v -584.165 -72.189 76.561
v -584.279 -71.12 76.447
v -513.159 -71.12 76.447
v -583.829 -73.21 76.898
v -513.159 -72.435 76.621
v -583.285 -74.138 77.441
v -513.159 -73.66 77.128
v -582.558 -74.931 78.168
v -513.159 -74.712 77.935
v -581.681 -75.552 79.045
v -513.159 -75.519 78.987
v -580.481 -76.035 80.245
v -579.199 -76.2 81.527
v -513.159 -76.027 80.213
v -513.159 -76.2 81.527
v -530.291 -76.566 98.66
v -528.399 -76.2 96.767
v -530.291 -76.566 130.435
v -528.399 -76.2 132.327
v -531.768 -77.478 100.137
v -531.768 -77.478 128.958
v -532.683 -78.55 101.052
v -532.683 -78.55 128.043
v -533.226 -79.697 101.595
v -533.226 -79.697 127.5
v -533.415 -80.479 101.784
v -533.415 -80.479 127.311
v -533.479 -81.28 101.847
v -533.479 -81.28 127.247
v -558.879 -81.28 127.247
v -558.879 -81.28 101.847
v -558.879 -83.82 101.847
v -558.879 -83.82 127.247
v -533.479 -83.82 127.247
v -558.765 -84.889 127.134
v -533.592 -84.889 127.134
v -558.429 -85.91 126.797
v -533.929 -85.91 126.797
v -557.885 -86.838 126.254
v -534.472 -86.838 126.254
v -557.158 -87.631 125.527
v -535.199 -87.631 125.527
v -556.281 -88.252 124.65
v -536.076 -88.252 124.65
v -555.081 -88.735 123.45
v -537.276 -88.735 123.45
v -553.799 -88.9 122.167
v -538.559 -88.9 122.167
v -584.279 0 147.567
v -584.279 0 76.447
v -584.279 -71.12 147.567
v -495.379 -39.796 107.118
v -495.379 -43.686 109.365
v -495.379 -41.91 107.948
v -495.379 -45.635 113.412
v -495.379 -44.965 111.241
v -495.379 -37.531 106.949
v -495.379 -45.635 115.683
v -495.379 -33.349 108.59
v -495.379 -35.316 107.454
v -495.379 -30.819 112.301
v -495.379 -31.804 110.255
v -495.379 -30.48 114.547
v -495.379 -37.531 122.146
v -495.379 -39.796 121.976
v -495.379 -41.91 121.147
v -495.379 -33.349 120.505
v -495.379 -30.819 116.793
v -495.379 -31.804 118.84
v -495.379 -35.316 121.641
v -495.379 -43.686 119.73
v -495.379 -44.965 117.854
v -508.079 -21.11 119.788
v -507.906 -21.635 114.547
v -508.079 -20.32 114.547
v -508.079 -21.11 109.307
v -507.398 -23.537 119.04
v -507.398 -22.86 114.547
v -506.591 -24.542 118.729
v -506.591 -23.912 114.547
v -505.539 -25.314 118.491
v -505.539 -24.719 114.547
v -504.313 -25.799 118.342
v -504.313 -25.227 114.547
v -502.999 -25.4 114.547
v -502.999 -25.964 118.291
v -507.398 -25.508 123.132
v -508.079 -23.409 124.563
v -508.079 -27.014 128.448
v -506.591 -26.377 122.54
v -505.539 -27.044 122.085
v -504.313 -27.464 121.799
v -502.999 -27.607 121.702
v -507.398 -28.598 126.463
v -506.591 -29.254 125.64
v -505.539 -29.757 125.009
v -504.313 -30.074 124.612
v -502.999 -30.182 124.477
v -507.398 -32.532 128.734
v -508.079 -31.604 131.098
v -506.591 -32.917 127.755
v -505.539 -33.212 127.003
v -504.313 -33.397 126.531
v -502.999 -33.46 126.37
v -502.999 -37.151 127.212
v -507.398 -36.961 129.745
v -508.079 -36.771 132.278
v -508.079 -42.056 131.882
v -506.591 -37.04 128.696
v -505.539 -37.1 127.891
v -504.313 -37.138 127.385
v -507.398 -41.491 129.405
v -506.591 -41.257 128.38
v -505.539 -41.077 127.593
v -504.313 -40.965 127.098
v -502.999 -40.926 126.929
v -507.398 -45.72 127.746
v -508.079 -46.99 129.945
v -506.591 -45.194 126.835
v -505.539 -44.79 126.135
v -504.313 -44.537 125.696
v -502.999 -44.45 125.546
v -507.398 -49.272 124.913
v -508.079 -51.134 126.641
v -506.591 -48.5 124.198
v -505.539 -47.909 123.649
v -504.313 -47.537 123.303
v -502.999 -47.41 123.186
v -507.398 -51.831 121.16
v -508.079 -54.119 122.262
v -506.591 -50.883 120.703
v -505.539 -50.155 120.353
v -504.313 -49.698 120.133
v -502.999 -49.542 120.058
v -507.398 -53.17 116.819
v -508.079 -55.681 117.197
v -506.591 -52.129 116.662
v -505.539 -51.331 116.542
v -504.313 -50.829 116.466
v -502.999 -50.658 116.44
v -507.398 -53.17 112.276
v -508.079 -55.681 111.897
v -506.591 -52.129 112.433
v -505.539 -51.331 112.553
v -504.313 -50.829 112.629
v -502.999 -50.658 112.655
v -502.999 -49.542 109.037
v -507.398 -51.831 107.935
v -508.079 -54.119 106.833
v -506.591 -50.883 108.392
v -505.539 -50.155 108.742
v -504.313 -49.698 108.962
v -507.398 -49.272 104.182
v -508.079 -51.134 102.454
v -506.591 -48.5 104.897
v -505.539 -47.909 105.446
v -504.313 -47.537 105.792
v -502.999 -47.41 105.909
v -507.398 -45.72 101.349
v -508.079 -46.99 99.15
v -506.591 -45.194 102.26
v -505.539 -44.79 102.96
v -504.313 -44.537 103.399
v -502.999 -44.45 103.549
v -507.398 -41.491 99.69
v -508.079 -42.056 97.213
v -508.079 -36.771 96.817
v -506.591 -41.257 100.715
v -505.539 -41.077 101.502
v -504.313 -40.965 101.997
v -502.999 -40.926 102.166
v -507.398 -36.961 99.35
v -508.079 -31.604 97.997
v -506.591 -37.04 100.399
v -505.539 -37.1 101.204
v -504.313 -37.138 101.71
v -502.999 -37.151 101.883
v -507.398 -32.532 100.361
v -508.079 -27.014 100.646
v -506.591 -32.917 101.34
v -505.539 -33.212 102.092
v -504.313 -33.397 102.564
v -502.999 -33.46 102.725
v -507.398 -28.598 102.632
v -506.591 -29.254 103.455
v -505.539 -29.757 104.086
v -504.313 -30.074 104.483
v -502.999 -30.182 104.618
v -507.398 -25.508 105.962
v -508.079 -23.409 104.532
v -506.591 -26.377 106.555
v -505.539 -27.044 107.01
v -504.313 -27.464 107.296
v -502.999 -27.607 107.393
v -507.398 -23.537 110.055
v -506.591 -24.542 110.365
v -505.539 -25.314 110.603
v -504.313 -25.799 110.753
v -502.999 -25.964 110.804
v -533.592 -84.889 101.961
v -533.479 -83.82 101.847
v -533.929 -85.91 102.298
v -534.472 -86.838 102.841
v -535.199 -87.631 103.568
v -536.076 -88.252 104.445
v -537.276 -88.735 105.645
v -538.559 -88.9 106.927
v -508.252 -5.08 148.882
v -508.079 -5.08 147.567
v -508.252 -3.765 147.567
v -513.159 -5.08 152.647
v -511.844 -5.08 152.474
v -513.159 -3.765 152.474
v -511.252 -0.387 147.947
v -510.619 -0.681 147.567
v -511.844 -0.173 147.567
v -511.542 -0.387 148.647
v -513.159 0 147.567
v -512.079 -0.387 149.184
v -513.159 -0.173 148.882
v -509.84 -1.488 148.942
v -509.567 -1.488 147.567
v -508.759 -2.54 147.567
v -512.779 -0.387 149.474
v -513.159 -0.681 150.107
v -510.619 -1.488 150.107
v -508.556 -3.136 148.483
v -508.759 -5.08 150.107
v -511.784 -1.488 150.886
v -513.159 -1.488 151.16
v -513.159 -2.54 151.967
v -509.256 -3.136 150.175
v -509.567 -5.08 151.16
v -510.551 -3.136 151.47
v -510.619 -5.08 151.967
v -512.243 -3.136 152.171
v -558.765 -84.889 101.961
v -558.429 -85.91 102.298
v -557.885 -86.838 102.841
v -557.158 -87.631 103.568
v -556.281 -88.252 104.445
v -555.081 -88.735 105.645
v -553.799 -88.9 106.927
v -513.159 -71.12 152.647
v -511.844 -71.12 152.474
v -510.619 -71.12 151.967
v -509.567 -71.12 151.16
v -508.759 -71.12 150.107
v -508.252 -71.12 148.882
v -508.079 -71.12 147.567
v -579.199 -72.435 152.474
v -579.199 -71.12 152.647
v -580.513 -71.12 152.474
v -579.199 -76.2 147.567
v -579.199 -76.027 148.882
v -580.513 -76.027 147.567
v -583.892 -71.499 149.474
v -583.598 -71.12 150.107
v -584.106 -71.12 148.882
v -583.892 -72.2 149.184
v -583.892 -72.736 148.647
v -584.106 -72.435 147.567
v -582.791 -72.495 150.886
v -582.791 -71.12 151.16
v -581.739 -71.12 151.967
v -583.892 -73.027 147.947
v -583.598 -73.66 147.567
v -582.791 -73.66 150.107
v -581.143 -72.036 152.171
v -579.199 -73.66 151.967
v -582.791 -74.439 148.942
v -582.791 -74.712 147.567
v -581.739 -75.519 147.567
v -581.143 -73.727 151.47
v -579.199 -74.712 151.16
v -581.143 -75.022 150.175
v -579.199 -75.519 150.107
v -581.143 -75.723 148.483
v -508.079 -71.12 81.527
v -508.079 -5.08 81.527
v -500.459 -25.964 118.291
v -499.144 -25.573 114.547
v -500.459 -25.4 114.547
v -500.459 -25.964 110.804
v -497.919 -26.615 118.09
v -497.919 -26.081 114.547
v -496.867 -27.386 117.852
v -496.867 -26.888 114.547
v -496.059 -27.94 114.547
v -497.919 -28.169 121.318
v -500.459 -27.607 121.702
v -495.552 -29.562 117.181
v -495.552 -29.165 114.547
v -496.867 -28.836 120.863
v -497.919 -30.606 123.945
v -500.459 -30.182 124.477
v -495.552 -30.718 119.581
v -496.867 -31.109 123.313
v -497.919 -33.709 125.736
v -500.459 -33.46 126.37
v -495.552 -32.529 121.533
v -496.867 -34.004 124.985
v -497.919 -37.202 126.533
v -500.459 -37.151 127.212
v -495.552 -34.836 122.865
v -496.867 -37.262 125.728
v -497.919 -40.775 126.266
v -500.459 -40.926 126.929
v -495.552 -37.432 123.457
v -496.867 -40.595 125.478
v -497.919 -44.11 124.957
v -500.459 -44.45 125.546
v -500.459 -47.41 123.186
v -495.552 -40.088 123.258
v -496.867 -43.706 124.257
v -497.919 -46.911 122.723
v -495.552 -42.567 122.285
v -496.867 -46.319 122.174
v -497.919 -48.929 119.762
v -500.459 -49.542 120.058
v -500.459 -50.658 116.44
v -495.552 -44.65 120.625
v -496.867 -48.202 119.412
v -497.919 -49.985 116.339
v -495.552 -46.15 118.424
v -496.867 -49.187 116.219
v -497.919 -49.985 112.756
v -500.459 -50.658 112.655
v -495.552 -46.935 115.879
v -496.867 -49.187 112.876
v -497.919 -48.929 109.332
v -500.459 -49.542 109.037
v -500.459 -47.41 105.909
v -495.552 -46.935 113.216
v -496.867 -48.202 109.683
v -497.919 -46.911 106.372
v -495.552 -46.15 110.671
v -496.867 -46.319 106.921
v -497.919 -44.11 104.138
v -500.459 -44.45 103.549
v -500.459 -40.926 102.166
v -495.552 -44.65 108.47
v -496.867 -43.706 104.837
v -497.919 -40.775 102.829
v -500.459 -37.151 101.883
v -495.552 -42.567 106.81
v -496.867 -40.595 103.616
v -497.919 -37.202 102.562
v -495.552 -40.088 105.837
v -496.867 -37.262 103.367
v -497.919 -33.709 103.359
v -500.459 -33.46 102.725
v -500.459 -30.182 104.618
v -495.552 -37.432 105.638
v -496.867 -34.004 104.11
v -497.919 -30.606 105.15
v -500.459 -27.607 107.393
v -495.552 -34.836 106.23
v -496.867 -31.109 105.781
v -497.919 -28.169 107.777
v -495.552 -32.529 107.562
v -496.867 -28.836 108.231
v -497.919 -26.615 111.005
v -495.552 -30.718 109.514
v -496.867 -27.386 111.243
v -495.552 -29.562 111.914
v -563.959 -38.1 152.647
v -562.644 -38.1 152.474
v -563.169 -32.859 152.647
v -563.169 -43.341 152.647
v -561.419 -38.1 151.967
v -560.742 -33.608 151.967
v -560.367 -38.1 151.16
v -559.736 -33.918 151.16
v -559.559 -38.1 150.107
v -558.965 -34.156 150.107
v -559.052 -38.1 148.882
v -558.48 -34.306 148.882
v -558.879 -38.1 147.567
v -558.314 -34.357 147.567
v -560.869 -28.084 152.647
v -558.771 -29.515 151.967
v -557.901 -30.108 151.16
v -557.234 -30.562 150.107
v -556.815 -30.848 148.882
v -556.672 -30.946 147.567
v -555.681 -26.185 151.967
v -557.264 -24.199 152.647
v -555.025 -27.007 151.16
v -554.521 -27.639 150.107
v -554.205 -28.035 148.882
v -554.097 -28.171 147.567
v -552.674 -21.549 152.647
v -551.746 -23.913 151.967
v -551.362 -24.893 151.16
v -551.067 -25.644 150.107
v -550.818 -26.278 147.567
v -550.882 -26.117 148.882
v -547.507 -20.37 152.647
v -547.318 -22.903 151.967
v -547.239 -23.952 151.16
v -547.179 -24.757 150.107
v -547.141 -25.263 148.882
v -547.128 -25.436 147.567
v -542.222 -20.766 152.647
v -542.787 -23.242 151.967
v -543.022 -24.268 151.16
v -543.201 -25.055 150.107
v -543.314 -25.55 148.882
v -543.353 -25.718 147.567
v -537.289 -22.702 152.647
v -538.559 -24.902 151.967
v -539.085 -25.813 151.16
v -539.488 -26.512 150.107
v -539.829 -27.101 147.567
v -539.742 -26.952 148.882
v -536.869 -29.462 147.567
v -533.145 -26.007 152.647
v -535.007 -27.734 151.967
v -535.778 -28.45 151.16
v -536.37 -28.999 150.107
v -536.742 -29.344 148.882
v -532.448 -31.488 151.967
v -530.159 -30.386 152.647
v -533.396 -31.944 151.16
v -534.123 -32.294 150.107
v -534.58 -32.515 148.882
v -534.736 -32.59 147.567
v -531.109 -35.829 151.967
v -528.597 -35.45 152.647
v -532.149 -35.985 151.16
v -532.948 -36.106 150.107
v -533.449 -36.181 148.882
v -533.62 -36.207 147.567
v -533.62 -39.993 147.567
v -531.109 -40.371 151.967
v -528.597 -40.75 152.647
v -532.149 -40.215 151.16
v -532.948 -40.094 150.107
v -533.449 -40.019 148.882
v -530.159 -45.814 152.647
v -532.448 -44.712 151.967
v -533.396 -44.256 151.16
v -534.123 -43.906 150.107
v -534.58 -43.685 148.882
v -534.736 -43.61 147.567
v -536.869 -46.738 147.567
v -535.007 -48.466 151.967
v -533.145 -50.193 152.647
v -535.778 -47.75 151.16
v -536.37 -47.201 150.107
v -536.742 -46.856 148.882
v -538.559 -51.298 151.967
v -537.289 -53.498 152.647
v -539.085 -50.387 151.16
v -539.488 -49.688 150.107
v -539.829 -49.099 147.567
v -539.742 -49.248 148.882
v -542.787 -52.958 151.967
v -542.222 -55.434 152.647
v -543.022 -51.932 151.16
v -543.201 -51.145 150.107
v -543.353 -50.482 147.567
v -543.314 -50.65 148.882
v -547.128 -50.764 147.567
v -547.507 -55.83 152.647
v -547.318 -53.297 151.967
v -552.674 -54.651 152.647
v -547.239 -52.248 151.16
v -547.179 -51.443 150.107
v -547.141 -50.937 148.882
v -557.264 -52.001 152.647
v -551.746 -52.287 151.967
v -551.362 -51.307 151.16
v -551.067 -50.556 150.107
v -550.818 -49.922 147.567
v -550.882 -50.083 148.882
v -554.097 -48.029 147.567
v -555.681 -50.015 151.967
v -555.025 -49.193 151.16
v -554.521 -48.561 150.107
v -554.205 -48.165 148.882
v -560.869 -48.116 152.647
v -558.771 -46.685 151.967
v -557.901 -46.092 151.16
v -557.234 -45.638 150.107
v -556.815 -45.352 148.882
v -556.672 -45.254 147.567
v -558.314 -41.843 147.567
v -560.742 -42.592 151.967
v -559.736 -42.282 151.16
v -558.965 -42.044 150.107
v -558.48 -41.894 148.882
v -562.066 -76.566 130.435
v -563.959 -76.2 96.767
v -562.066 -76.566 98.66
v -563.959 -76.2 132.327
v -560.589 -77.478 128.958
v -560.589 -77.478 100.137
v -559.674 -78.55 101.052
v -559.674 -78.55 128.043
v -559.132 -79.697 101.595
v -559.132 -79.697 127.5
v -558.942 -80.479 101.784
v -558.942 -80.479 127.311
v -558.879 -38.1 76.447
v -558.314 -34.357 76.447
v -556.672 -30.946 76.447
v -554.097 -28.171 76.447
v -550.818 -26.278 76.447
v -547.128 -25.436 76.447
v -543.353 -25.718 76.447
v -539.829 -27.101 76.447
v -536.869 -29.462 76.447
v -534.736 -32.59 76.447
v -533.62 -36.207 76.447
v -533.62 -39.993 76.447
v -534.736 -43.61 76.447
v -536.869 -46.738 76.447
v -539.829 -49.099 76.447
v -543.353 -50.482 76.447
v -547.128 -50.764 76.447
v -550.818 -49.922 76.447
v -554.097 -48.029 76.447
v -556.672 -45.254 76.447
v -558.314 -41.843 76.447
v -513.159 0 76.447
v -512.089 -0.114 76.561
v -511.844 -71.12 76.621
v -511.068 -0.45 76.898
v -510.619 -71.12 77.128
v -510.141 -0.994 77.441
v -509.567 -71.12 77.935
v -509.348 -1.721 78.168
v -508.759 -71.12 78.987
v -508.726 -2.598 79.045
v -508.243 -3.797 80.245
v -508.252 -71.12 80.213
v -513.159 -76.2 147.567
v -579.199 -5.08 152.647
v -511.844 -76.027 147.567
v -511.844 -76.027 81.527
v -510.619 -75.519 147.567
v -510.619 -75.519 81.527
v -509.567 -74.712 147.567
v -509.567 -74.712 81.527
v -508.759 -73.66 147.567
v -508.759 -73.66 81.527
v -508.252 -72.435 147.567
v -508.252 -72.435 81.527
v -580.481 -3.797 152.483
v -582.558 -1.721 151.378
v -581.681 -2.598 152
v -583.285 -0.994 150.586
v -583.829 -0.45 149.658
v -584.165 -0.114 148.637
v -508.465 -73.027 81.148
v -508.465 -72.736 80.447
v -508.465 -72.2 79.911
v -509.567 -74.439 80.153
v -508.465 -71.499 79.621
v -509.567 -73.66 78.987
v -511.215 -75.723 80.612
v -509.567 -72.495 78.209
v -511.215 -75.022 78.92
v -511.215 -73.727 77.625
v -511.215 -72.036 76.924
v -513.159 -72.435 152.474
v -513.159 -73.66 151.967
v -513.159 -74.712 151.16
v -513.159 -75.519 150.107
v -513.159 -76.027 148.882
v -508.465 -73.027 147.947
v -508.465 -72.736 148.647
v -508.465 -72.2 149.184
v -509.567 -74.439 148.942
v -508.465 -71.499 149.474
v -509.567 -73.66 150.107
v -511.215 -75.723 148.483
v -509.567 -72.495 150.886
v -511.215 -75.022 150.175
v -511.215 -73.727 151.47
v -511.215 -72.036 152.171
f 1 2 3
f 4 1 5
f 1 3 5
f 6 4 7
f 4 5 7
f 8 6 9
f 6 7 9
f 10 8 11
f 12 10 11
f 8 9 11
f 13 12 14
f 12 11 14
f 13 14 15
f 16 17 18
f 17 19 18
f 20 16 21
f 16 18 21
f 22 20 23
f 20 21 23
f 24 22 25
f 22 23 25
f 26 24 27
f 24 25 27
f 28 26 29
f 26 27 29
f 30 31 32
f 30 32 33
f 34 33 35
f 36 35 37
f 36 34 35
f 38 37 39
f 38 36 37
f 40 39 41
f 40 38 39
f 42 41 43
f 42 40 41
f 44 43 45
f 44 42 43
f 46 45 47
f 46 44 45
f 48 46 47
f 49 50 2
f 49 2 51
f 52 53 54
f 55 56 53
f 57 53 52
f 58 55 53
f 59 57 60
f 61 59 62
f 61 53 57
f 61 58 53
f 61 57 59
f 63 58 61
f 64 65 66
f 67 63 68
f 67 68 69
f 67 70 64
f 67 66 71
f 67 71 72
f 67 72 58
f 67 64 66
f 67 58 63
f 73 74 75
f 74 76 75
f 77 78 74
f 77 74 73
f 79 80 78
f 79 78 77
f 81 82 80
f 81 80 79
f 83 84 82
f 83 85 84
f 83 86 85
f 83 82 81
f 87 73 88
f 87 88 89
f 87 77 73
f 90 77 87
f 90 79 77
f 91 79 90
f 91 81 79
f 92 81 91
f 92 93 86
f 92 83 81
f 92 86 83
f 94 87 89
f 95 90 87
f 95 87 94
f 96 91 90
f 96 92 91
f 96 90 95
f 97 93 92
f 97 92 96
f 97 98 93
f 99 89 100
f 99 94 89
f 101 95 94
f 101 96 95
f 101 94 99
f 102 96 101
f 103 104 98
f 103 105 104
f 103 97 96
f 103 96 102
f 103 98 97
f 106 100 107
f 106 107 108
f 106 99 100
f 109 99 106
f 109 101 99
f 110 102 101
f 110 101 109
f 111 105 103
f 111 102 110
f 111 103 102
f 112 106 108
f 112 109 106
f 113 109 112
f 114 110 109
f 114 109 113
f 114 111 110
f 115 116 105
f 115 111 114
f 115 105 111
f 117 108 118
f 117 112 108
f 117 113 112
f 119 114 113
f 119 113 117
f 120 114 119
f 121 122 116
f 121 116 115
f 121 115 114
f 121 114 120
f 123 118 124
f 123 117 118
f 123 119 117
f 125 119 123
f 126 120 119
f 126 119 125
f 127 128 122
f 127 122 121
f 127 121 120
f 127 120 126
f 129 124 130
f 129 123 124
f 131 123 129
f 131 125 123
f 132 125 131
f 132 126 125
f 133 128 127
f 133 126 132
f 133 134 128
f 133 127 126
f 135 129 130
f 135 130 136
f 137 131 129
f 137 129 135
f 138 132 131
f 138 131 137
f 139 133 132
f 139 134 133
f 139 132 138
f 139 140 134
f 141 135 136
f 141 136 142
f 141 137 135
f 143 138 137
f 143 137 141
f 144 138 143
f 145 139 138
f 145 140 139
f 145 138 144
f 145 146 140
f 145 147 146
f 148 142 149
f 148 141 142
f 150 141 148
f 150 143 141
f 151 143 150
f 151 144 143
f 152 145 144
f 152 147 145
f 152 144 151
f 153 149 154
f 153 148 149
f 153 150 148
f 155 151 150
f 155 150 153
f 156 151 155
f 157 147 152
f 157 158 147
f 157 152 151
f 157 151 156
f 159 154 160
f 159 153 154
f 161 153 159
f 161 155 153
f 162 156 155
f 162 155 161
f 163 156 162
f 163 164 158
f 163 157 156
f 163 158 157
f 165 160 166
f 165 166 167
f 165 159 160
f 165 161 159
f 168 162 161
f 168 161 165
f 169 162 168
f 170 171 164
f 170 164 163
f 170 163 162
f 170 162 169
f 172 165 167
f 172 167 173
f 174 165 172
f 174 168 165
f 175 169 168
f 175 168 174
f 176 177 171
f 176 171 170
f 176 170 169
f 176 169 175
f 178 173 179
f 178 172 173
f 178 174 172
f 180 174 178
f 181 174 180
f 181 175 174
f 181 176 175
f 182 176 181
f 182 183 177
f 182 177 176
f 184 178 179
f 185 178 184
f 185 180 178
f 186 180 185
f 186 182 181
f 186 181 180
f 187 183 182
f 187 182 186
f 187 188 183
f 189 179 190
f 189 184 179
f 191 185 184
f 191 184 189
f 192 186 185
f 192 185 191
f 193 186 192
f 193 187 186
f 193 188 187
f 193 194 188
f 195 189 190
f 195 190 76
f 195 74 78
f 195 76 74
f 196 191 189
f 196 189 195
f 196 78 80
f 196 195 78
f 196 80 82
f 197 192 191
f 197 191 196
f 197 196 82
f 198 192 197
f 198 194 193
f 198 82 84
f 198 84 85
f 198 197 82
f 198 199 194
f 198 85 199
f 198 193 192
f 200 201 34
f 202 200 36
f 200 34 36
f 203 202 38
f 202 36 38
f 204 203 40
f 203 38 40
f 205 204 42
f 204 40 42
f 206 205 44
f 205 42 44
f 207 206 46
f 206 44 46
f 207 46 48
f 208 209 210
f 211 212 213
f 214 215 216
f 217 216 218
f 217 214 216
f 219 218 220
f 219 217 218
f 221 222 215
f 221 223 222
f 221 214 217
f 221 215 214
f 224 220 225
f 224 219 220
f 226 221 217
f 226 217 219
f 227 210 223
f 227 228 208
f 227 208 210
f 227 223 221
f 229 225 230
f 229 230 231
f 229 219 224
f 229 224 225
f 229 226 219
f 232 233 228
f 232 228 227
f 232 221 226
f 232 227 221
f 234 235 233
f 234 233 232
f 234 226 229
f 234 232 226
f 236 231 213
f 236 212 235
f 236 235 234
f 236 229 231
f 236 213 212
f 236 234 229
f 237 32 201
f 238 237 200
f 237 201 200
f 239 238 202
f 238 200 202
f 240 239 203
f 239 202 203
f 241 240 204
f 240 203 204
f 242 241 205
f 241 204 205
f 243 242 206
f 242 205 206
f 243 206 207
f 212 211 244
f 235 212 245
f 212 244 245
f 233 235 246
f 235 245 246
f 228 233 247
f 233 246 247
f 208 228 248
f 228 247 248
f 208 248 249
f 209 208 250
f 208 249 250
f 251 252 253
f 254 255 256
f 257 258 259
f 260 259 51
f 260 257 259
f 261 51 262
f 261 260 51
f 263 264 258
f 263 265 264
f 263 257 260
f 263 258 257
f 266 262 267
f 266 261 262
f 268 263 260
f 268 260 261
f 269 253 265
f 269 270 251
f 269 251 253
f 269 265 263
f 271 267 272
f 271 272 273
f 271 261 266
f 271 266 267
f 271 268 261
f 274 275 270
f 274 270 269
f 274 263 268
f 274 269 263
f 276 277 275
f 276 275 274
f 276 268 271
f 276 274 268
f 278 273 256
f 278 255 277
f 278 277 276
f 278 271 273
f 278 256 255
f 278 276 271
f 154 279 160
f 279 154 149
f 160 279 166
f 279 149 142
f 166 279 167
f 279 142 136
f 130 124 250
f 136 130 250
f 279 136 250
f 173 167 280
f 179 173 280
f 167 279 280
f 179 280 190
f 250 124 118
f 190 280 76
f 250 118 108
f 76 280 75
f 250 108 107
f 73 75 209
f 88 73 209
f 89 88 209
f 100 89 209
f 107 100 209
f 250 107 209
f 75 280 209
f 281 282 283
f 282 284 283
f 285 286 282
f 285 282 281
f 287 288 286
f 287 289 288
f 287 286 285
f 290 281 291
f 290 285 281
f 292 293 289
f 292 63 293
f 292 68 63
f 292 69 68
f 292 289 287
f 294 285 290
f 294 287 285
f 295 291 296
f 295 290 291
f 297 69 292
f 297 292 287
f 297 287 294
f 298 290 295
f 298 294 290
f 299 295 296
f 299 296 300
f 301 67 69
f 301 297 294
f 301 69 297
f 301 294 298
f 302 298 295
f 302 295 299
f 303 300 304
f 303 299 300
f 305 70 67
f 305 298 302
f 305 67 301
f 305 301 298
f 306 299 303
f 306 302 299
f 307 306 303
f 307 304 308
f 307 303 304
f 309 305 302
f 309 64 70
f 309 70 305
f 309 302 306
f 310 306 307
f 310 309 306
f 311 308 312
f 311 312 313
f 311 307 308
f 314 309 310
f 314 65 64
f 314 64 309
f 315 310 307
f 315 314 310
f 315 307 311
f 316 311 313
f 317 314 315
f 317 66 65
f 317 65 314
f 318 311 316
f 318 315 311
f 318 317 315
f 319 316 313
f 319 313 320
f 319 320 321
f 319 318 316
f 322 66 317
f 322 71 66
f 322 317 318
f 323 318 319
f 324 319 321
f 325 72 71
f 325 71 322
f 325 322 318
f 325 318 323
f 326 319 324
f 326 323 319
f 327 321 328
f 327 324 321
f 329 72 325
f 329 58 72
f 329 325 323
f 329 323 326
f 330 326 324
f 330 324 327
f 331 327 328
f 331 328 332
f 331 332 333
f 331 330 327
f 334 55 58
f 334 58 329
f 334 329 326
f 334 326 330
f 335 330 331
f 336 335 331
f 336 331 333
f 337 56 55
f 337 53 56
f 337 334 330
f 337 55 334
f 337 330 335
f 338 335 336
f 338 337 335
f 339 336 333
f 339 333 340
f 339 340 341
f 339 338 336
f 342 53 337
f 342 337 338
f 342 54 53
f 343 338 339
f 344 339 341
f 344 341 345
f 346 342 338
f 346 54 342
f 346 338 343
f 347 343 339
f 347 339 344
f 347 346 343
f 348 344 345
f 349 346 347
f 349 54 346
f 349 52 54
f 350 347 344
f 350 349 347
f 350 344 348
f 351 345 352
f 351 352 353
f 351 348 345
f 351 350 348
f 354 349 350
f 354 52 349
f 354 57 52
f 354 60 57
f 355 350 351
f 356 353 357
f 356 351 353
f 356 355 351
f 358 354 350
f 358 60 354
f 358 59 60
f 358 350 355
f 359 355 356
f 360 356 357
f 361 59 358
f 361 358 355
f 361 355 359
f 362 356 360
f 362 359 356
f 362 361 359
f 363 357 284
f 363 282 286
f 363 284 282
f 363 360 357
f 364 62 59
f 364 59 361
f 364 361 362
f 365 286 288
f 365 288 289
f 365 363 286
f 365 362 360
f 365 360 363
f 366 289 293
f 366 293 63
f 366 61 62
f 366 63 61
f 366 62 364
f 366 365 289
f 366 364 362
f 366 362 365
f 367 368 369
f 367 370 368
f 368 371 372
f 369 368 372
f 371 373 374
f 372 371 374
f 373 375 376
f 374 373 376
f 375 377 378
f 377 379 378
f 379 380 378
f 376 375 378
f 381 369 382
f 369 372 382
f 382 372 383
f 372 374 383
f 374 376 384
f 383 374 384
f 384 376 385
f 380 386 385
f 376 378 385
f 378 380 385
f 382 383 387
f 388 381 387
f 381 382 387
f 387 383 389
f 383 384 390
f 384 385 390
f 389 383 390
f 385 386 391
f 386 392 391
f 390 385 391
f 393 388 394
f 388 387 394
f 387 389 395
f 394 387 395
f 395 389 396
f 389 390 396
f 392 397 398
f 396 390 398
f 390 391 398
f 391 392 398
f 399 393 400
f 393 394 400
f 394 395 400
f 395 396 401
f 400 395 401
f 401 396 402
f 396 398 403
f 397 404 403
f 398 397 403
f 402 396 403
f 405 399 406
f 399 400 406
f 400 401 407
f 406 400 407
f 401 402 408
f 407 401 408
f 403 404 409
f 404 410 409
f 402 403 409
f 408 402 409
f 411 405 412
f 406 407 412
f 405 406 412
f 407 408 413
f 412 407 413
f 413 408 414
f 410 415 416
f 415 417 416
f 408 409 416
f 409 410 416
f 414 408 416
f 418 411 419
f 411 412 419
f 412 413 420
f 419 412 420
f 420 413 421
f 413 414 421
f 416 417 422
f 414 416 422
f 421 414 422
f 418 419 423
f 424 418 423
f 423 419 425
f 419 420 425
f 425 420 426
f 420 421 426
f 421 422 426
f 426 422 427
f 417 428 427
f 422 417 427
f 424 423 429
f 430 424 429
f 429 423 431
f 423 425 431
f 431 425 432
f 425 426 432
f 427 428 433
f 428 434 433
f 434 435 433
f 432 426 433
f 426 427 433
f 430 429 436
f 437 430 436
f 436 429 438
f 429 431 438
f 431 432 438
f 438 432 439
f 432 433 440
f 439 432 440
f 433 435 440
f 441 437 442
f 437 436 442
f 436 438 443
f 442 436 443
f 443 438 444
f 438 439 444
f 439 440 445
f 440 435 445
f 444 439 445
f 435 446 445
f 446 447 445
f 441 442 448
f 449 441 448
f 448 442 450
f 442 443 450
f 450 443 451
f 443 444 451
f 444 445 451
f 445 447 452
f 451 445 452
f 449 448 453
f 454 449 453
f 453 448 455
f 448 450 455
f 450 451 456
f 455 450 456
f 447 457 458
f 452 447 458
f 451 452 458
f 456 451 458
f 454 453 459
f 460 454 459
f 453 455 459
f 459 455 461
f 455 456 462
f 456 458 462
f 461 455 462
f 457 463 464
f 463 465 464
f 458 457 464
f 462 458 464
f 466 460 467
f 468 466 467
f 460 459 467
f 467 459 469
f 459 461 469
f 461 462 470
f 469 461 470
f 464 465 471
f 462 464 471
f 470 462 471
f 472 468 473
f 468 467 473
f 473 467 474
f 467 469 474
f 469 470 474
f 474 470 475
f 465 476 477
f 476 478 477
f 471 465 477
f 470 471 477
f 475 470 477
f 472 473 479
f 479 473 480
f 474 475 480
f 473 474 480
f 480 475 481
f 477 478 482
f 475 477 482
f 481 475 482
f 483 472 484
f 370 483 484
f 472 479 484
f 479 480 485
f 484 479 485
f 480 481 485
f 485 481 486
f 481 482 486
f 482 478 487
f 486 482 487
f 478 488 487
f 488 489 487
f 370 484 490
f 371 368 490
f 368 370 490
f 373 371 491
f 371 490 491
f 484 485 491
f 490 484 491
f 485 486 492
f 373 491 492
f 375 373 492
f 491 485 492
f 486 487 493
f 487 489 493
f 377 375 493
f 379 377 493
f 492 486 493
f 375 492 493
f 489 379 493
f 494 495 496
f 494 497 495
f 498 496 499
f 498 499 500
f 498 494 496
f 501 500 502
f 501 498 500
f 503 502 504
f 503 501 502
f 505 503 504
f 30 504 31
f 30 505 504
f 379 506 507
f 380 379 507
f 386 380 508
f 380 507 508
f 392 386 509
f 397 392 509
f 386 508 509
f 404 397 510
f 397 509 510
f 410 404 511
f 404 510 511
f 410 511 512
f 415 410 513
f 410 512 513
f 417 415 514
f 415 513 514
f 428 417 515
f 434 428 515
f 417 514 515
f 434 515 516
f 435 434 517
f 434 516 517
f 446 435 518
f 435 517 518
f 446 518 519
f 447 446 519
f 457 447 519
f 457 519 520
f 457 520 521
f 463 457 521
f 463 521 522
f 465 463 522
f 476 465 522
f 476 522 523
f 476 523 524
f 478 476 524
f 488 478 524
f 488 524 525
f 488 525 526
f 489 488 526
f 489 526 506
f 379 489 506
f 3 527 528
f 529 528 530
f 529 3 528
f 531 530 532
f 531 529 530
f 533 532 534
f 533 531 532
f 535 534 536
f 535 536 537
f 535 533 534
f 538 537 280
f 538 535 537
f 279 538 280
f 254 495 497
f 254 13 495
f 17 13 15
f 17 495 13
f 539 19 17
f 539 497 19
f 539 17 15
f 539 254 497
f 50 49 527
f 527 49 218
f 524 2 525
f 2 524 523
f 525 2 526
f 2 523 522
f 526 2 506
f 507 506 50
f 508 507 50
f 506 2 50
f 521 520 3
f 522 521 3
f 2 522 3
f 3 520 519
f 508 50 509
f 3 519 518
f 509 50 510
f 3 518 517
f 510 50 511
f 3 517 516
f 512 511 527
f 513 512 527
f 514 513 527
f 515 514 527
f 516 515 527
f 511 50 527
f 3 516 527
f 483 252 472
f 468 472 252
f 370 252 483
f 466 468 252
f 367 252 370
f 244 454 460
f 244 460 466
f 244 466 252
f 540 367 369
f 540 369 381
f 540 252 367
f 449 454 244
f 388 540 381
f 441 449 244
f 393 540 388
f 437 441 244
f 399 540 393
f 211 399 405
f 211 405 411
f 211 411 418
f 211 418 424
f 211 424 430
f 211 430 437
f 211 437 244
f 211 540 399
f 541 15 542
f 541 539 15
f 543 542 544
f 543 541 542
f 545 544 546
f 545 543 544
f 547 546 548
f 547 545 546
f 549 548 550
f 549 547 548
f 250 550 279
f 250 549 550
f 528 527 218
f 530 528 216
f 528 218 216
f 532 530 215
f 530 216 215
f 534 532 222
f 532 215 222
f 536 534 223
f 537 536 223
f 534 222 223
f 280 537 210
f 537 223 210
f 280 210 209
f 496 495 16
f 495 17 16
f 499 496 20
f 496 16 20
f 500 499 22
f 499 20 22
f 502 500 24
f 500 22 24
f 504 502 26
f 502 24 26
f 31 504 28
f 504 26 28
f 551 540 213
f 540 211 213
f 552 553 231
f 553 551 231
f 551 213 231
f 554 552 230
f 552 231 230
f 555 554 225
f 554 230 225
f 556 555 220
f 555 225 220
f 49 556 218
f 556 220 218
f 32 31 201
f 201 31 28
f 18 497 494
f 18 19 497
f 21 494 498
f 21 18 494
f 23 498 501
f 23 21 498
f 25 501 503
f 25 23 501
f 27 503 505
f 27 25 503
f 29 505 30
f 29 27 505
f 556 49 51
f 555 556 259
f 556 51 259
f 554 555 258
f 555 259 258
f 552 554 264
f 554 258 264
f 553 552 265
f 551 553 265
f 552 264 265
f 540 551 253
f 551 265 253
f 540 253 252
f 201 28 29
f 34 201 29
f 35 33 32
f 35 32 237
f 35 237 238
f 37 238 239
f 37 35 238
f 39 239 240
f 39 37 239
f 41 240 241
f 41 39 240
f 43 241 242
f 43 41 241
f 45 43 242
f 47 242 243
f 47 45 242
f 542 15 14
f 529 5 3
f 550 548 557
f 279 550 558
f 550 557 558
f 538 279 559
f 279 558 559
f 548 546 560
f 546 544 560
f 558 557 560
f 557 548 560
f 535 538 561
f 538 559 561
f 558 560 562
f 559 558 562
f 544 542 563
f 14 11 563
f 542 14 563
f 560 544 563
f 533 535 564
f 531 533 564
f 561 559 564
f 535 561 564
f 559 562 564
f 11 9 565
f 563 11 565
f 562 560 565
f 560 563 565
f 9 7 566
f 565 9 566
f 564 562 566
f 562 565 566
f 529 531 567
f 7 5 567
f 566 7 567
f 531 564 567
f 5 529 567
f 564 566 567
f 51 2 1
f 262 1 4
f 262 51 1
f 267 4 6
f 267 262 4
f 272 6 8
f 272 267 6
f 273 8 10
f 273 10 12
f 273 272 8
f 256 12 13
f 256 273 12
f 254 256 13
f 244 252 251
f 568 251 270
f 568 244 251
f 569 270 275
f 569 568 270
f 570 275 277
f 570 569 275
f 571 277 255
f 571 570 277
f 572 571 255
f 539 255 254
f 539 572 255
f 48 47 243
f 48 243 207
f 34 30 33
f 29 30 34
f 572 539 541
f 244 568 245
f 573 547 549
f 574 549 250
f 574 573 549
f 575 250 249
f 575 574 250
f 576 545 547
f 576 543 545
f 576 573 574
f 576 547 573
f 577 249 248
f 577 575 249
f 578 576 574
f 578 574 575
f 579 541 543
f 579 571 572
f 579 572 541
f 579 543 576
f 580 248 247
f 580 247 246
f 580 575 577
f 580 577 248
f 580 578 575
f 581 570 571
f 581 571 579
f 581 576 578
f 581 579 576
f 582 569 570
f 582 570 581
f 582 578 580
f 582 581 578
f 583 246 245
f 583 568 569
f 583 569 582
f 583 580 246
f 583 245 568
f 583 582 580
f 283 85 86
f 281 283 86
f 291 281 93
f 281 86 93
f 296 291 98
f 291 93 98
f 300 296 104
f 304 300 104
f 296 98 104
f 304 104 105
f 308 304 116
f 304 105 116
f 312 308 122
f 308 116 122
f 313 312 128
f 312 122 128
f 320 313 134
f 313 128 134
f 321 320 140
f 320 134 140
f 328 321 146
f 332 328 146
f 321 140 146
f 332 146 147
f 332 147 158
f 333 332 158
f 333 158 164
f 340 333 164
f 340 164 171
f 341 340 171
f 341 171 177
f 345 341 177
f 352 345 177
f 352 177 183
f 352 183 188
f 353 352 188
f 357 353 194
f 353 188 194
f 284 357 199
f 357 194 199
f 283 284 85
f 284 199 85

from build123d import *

# Parameters (mm, degrees)
F0_W     = 76.2
F0_H     = 76.2
F1_DEPTH = 76.2
F3_D     = 25.4
F4_W     = 25.4
F4_H     = 25.4
F5_DEPTH = 12.7
F6_R     = 12.7
F7_DEPTH = 12.7
F8_R     = 5.08


with BuildPart() as f1:
    # F0 (on Front) → F1 (new body)
    with BuildSketch(Plane.XZ):
        with Locations((-546.1786431313, 114.5474496245)):
            Rectangle(F0_W, F0_H)
    extrude(amount=F1_DEPTH)

    # F3 (through all)
    with Locations(Plane.XY.offset(152.6474496245)):
        with Locations((-546.1786431313, -38.1)):
            Hole(F3_D / 2)

    # F4 (on face) → F5 (join)
    with BuildSketch(Plane.XZ.offset(76.2)):
        with Locations((-546.1786431313, 114.5474496245)):
            Rectangle(F4_W, F4_H)
    extrude(amount=F5_DEPTH)

    # F6 (on face) → F7 (join)
    with BuildSketch(Plane.YZ.offset(-508.0786431313)):
        with Locations((-38.1, 114.5474496245)):
            Circle(F6_R)
    extrude(amount=F7_DEPTH)

    # F8
    f8_edges = [f1.edges().sort_by_distance(p)[0] for p in [
        (-546.178643, -76.2, 152.64745),
        (-584.278643, -38.1, 152.64745),
        (-546.178643, -88.9, 127.24745),
        (-533.478643, -88.9, 114.54745),
        (-546.178643, -88.9, 101.84745),
        (-558.878643, -88.9, 114.54745),
        (-508.078643, -50.8, 114.54745),
        (-495.378643, -50.8, 114.54745),
        (-584.278643, -76.2, 114.54745),
        (-546.178643, -76.2, 76.44745),
        (-508.078643, -76.2, 114.54745),
        (-533.478643, -76.2, 114.54745),
        (-546.178643, -76.2, 127.24745),
        (-558.878643, -76.2, 114.54745),
        (-546.178643, -76.2, 101.84745),
        (-508.078643, -38.1, 152.64745),
        (-508.078643, 0, 114.54745),
        (-508.078643, -38.1, 76.44745),
        (-546.178643, 0, 152.64745),
        (-558.878643, -38.1, 152.64745),
    ]]
    fillet(f8_edges, radius=F8_R)


solid = f1.part
